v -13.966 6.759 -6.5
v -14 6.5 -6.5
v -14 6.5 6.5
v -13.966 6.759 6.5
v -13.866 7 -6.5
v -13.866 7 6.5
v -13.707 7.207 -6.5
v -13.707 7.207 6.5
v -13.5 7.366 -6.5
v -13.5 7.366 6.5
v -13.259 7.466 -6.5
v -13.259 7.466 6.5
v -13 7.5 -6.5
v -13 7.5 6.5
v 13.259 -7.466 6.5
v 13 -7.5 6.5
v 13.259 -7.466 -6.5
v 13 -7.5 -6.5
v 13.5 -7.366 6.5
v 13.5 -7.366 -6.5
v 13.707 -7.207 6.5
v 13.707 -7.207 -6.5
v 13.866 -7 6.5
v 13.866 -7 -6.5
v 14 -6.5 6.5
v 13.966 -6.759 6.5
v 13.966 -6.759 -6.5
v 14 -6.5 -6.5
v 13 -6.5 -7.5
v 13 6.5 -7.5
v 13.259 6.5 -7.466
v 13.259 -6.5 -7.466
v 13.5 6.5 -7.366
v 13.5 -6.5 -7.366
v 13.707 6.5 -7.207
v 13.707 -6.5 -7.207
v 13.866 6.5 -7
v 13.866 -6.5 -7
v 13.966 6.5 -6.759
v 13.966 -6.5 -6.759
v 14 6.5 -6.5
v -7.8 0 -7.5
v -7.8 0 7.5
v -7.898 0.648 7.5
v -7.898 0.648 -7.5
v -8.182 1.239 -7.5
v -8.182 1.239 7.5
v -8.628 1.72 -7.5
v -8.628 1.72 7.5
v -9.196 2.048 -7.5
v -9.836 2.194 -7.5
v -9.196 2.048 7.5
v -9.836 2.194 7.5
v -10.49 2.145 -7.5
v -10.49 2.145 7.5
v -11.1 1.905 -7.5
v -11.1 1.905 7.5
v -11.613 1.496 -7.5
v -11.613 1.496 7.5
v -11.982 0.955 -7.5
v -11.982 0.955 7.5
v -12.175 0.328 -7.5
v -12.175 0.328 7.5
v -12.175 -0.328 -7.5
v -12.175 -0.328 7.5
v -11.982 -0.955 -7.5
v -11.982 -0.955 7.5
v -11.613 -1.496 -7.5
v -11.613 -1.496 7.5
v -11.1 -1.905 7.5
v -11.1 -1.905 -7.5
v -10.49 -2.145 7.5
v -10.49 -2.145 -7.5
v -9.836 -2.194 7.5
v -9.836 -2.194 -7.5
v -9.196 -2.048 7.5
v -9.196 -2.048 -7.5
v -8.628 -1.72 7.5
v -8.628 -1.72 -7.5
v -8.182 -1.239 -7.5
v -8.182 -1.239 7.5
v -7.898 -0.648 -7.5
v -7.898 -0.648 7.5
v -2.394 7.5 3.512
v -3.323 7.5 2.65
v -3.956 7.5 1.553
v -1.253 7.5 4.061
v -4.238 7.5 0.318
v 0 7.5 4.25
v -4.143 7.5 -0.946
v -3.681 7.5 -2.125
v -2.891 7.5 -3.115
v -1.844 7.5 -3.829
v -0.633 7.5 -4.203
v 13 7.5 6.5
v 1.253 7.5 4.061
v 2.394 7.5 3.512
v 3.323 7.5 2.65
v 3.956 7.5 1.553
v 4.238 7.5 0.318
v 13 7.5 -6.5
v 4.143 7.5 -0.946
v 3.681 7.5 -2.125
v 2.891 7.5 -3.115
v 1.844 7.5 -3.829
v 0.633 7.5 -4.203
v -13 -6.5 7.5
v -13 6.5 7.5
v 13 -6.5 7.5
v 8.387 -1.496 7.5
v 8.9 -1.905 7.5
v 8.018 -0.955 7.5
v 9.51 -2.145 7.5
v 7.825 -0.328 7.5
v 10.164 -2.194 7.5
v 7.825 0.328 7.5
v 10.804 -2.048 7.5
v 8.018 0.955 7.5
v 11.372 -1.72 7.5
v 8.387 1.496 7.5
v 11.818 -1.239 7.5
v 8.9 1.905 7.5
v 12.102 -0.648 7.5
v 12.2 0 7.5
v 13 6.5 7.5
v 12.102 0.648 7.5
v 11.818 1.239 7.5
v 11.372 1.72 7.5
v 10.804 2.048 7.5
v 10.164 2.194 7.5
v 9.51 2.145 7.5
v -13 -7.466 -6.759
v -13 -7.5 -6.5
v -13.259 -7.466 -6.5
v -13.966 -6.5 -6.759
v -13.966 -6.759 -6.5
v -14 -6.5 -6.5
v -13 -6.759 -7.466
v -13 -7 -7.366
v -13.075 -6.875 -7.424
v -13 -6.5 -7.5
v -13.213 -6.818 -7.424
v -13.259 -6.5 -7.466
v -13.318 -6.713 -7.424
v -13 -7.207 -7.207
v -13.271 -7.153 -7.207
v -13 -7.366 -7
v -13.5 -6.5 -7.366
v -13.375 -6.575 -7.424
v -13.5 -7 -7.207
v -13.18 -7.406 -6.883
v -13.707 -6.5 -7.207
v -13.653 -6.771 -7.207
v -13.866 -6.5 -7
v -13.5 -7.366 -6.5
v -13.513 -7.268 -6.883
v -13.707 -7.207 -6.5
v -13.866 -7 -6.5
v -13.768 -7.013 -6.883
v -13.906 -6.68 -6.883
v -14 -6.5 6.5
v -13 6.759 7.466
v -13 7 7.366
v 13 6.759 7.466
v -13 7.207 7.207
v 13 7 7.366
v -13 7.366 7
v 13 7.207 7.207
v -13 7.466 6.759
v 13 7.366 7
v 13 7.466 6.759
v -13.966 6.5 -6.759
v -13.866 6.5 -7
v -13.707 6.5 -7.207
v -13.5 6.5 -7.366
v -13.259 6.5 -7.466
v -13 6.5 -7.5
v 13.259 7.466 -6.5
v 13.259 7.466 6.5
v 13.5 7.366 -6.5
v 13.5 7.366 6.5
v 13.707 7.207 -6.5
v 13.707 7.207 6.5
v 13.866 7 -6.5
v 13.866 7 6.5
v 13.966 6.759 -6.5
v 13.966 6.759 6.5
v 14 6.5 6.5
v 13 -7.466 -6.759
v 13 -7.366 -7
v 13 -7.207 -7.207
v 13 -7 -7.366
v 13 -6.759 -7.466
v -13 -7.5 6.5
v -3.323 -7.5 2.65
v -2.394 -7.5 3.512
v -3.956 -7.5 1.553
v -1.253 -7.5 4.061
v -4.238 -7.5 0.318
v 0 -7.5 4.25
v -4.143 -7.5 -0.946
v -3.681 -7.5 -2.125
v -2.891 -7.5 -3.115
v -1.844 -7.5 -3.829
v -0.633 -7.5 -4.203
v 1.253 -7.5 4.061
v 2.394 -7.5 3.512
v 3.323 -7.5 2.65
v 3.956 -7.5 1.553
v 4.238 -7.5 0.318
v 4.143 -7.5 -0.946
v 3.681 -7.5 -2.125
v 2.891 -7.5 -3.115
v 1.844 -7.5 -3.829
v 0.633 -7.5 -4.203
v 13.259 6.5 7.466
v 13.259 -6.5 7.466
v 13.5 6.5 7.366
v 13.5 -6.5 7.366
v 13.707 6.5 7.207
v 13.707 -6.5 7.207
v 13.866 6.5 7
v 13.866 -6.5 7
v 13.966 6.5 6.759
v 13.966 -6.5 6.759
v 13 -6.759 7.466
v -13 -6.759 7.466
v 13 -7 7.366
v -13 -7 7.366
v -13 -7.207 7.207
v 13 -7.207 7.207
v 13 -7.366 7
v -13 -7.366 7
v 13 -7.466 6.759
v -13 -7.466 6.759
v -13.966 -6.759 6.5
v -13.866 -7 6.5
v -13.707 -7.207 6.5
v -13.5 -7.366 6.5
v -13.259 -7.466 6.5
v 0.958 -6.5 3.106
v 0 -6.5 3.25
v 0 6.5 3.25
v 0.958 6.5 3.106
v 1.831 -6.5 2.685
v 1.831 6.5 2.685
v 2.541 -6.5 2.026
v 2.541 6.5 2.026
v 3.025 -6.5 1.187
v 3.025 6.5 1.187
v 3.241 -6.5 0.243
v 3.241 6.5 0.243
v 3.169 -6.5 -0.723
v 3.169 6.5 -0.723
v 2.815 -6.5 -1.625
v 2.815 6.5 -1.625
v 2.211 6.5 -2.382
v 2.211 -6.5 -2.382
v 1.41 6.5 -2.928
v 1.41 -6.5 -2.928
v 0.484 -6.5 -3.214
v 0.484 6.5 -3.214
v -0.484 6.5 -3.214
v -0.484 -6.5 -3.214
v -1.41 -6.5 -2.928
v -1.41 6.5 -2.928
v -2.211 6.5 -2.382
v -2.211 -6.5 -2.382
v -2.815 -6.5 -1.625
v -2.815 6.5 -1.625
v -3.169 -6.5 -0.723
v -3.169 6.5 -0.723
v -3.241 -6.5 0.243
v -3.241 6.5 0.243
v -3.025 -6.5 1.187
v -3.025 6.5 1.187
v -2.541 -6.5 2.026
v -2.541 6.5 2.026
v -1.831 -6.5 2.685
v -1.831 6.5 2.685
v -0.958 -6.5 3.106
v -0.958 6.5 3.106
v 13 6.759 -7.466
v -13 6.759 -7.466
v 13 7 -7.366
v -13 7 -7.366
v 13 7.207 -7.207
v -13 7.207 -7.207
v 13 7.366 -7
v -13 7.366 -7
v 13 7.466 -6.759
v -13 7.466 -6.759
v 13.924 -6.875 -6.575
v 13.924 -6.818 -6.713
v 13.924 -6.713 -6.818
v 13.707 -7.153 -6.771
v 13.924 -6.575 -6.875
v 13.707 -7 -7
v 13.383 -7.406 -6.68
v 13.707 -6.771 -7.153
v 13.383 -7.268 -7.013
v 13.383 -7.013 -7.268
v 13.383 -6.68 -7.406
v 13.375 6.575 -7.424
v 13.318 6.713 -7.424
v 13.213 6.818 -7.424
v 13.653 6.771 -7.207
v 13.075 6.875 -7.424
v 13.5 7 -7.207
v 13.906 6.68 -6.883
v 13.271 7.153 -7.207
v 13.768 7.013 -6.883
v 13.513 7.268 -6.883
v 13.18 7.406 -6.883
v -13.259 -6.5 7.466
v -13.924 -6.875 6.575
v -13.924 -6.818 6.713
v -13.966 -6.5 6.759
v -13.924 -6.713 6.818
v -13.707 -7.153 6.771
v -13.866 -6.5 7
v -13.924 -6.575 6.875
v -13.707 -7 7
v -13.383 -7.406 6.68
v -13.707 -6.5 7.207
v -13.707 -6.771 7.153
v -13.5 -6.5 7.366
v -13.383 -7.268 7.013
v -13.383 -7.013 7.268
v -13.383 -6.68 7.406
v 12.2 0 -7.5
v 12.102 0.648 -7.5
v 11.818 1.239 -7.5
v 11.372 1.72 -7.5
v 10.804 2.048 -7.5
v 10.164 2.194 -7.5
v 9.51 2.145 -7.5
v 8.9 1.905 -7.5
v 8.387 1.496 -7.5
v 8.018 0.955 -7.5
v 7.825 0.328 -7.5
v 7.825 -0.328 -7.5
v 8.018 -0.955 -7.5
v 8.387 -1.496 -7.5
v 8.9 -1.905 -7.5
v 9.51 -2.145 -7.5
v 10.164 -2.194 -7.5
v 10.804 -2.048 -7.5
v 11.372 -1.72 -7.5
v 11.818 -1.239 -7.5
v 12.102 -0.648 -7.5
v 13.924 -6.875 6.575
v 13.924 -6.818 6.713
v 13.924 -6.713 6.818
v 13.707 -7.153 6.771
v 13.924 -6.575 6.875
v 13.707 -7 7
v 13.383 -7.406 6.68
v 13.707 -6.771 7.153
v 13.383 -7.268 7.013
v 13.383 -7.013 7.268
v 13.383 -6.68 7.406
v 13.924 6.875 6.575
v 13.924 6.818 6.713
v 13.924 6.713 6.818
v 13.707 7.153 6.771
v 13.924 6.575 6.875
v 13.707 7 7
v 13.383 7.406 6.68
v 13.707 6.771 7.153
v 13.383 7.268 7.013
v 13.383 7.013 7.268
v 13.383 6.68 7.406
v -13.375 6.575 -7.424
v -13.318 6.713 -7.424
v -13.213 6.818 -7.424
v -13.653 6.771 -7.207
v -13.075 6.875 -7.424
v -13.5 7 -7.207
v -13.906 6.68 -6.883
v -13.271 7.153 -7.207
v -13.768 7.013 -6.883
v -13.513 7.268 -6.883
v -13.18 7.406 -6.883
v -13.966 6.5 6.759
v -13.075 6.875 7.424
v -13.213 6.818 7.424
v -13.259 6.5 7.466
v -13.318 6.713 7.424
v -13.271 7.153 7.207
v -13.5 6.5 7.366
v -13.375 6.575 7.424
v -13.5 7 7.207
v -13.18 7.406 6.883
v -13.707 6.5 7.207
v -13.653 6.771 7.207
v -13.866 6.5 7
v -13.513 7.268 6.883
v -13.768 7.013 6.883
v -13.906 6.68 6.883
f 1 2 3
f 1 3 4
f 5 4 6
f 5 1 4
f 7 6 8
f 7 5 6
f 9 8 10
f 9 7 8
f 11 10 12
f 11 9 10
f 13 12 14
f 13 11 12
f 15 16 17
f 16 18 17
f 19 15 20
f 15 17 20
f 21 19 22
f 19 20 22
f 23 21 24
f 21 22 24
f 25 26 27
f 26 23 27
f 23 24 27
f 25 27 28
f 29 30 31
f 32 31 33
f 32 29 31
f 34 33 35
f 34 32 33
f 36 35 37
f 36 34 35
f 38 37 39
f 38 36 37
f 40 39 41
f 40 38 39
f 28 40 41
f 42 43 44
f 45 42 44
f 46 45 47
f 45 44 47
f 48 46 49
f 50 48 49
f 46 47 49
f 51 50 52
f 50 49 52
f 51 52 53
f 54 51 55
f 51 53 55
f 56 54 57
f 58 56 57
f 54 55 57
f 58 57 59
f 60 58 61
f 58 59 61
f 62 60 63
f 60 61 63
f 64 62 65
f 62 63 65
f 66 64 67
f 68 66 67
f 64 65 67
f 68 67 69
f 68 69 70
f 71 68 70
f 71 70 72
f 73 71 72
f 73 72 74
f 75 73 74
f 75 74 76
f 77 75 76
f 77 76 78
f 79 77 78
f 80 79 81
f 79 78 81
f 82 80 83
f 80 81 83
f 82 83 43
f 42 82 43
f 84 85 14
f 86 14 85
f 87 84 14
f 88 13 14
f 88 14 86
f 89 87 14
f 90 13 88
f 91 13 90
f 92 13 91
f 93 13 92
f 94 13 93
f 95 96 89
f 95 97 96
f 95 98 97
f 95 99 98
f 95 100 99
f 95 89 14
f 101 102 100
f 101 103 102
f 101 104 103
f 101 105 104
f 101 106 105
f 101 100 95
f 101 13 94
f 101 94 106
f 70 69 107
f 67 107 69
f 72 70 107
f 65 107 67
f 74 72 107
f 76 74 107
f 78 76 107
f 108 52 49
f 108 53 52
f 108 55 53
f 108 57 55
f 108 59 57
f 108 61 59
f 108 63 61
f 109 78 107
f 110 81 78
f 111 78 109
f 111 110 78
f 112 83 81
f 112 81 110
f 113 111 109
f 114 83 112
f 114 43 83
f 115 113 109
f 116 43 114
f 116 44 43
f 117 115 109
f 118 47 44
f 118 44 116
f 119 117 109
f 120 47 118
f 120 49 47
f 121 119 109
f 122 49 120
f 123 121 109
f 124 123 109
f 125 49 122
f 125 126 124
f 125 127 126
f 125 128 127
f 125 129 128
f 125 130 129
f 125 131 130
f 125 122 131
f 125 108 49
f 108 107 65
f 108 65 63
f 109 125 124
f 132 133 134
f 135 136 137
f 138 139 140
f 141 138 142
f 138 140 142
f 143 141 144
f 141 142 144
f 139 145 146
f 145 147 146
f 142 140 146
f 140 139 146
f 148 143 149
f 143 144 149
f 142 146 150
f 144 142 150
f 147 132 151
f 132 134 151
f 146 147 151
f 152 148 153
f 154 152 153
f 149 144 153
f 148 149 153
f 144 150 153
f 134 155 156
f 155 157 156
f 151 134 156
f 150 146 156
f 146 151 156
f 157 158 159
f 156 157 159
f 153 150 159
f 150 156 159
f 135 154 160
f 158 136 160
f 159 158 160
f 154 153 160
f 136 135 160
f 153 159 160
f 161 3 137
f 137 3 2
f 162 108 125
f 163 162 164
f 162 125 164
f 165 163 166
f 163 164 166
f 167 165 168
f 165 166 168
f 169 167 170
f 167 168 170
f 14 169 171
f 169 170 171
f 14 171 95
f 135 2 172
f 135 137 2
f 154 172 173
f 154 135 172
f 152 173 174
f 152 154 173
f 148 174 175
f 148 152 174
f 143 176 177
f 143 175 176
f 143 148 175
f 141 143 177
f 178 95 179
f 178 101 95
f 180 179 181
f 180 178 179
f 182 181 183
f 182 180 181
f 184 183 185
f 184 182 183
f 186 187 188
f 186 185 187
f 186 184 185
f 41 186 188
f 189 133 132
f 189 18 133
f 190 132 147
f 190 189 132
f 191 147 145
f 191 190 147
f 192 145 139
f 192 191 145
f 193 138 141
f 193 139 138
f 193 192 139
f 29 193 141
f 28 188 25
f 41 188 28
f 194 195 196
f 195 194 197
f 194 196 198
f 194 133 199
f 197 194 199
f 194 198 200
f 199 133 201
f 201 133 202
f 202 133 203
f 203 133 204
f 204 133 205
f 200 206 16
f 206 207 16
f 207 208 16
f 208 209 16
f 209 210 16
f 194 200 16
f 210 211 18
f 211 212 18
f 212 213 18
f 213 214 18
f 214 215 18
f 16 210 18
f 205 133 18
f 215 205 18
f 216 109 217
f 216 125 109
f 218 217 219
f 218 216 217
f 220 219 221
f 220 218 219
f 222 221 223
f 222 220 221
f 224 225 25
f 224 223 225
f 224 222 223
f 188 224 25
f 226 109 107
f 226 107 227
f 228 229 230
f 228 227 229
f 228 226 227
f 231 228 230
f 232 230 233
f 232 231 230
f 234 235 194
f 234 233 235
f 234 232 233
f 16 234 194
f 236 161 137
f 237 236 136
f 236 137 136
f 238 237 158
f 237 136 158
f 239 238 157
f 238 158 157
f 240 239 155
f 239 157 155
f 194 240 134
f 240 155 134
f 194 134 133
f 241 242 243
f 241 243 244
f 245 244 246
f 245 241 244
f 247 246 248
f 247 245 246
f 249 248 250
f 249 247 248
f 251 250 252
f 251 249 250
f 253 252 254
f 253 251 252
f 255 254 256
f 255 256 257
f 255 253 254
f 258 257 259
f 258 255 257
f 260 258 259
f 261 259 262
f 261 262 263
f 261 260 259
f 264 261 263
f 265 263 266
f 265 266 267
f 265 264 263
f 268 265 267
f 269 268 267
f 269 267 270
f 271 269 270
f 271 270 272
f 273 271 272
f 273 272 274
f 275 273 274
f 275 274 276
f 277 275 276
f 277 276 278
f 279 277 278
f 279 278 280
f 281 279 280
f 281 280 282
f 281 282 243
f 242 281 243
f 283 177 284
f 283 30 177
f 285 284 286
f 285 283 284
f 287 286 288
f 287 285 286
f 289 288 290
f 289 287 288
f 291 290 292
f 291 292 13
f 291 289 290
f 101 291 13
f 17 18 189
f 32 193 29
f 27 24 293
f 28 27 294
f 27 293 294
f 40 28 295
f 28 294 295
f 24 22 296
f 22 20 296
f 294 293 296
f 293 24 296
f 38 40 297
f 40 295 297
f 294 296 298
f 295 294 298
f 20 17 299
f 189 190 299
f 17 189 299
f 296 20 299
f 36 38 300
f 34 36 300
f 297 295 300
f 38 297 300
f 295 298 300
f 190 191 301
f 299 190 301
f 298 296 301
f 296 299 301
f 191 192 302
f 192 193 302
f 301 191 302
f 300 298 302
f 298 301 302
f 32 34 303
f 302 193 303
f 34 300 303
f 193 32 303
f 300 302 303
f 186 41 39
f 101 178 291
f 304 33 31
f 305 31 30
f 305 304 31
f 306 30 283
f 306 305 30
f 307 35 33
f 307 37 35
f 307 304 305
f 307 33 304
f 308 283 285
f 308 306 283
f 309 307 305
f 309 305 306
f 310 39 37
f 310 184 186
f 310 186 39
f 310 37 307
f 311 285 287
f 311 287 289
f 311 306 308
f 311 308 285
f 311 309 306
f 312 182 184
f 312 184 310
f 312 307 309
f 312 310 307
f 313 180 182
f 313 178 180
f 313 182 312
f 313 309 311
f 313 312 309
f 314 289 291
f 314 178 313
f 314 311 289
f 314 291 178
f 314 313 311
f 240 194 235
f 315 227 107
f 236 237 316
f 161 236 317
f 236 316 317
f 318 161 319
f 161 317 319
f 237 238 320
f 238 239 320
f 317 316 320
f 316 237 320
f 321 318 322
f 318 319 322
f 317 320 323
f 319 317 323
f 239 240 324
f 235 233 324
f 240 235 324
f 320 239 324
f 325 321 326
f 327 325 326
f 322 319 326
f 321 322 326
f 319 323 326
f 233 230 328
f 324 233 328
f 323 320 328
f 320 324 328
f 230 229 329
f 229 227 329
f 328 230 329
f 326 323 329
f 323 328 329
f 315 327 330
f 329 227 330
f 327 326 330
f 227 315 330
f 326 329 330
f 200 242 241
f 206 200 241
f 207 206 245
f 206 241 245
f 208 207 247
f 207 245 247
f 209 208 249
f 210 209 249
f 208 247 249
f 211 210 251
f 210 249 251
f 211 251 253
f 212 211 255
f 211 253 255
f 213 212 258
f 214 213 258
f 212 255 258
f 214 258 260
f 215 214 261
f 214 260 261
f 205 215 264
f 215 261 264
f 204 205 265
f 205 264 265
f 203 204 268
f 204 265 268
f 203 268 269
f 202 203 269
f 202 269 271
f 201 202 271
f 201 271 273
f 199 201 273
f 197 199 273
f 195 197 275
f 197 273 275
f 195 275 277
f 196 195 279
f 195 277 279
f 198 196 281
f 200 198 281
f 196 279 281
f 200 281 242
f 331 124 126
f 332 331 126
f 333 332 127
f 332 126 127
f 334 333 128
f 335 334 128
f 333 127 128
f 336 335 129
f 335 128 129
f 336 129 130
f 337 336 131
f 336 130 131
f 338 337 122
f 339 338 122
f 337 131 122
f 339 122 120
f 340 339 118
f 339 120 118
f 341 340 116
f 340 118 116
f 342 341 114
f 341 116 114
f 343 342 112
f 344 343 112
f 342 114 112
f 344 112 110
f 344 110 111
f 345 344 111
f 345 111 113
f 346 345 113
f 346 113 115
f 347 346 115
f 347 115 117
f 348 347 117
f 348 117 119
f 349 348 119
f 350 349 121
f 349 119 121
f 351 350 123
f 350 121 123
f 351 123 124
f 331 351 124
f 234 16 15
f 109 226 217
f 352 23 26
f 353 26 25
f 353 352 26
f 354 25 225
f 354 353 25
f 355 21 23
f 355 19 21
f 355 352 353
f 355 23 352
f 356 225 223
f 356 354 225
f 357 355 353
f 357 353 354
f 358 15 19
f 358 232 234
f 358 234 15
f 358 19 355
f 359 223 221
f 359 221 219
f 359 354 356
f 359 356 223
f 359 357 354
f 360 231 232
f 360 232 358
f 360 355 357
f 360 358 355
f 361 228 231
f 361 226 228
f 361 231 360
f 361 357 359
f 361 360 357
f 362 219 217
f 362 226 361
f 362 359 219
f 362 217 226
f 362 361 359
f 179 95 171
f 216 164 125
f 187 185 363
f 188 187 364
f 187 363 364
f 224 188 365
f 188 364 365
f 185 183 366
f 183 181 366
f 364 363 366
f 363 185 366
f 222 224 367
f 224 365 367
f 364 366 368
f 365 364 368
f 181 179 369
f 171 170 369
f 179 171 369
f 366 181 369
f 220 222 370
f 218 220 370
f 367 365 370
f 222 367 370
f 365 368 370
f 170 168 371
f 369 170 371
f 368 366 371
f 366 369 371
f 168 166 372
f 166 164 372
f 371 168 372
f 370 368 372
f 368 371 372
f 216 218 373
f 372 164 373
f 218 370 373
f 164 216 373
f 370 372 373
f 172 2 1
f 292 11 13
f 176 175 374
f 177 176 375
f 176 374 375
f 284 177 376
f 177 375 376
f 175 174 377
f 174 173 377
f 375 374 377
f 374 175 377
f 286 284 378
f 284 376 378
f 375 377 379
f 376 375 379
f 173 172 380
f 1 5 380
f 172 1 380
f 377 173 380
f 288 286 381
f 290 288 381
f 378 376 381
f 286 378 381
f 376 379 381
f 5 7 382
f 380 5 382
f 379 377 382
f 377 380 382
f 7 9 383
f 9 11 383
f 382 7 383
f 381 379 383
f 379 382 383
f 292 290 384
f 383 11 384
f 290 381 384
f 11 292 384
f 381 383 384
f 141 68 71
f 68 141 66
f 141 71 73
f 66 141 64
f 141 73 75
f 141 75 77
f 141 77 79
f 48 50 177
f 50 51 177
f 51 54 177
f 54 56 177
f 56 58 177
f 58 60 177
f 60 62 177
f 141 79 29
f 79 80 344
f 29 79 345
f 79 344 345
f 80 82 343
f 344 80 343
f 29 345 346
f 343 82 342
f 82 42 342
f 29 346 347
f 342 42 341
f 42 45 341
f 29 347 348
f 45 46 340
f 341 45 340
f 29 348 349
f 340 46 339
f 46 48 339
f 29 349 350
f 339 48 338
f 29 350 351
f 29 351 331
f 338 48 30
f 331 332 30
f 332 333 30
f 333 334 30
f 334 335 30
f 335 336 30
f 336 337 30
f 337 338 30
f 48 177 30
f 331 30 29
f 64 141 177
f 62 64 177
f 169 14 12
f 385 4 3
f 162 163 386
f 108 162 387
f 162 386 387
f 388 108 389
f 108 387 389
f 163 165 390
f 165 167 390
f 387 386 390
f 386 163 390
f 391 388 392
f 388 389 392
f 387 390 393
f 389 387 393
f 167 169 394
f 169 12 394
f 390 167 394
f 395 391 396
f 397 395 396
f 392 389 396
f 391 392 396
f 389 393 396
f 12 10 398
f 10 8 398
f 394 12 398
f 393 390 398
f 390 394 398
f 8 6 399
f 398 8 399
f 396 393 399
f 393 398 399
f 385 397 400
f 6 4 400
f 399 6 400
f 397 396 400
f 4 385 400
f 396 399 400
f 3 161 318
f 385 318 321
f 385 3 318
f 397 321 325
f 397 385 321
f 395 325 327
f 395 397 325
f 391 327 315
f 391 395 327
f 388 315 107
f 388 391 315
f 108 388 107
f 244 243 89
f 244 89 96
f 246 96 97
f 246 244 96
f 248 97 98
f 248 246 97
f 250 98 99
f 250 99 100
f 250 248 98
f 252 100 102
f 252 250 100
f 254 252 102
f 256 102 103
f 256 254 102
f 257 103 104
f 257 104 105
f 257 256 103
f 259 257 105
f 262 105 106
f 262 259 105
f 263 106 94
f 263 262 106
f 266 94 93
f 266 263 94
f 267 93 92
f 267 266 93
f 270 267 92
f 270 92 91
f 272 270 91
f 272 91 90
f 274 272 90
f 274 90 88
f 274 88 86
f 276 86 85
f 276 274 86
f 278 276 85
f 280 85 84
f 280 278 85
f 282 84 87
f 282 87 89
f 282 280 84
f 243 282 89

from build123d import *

# Parameters (mm, degrees)
SKETCH_1_W          = 28
SKETCH_1_H          = 15
SKETCH_1_R          = 3.25
EXTRUDE_1_DEPTH     = 7.5
SKETCH_2_R          = 2.2
CUT_EXTRUDE_1_DEPTH = 15
FILLET_1_R          = 1
CHAMFER_1_SIZE      = 1


with BuildPart() as part:
    # 草图1 → 凸台-拉伸1 (new, symmetric)
    with BuildSketch(Plane(origin=(0, 0, 0), x_dir=(1, 0, 0), z_dir=(0, 1, 0))):
        Rectangle(SKETCH_1_W, SKETCH_1_H)
        with Locations(Location((0, 0, 0), (0, 0, 270))):
            Circle(SKETCH_1_R, mode=Mode.SUBTRACT)
    extrude(amount=EXTRUDE_1_DEPTH, both=True)

    # 草图2 → 切除-拉伸1 (cut)
    with BuildSketch(Plane.XY.offset(7.5)):
        with Locations((-10, 0)):
            Circle(SKETCH_2_R)
        with Locations((10, 0)):
            Circle(SKETCH_2_R)
    extrude(amount=-CUT_EXTRUDE_1_DEPTH, mode=Mode.SUBTRACT)

    # 圆角1
    fillet_1_edges = [part.edges().sort_by_distance(p)[0] for p in [
        (-14, 7.5, 0),
        (0, 7.5, 7.5),
        (14, 7.5, 0),
        (0, -7.5, 7.5),
        (-14, -7.5, 0),
        (0, -7.5, -7.5),
        (14, -7.5, 0),
        (14, 0, 7.5),
        (-14, 0, 7.5),
        (-14, 0, -7.5),
        (14, 0, -7.5),
        (0, 7.5, -7.5),
    ]]
    fillet(fillet_1_edges, radius=FILLET_1_R)

    # 倒角1
    chamfer_1_edges = [part.edges().sort_by_distance(p)[0] for p in [
        (0, -7.5, -3.25),
        (0, 7.5, -3.25),
    ]]
    chamfer(chamfer_1_edges, length=CHAMFER_1_SIZE)


solid = part.part
